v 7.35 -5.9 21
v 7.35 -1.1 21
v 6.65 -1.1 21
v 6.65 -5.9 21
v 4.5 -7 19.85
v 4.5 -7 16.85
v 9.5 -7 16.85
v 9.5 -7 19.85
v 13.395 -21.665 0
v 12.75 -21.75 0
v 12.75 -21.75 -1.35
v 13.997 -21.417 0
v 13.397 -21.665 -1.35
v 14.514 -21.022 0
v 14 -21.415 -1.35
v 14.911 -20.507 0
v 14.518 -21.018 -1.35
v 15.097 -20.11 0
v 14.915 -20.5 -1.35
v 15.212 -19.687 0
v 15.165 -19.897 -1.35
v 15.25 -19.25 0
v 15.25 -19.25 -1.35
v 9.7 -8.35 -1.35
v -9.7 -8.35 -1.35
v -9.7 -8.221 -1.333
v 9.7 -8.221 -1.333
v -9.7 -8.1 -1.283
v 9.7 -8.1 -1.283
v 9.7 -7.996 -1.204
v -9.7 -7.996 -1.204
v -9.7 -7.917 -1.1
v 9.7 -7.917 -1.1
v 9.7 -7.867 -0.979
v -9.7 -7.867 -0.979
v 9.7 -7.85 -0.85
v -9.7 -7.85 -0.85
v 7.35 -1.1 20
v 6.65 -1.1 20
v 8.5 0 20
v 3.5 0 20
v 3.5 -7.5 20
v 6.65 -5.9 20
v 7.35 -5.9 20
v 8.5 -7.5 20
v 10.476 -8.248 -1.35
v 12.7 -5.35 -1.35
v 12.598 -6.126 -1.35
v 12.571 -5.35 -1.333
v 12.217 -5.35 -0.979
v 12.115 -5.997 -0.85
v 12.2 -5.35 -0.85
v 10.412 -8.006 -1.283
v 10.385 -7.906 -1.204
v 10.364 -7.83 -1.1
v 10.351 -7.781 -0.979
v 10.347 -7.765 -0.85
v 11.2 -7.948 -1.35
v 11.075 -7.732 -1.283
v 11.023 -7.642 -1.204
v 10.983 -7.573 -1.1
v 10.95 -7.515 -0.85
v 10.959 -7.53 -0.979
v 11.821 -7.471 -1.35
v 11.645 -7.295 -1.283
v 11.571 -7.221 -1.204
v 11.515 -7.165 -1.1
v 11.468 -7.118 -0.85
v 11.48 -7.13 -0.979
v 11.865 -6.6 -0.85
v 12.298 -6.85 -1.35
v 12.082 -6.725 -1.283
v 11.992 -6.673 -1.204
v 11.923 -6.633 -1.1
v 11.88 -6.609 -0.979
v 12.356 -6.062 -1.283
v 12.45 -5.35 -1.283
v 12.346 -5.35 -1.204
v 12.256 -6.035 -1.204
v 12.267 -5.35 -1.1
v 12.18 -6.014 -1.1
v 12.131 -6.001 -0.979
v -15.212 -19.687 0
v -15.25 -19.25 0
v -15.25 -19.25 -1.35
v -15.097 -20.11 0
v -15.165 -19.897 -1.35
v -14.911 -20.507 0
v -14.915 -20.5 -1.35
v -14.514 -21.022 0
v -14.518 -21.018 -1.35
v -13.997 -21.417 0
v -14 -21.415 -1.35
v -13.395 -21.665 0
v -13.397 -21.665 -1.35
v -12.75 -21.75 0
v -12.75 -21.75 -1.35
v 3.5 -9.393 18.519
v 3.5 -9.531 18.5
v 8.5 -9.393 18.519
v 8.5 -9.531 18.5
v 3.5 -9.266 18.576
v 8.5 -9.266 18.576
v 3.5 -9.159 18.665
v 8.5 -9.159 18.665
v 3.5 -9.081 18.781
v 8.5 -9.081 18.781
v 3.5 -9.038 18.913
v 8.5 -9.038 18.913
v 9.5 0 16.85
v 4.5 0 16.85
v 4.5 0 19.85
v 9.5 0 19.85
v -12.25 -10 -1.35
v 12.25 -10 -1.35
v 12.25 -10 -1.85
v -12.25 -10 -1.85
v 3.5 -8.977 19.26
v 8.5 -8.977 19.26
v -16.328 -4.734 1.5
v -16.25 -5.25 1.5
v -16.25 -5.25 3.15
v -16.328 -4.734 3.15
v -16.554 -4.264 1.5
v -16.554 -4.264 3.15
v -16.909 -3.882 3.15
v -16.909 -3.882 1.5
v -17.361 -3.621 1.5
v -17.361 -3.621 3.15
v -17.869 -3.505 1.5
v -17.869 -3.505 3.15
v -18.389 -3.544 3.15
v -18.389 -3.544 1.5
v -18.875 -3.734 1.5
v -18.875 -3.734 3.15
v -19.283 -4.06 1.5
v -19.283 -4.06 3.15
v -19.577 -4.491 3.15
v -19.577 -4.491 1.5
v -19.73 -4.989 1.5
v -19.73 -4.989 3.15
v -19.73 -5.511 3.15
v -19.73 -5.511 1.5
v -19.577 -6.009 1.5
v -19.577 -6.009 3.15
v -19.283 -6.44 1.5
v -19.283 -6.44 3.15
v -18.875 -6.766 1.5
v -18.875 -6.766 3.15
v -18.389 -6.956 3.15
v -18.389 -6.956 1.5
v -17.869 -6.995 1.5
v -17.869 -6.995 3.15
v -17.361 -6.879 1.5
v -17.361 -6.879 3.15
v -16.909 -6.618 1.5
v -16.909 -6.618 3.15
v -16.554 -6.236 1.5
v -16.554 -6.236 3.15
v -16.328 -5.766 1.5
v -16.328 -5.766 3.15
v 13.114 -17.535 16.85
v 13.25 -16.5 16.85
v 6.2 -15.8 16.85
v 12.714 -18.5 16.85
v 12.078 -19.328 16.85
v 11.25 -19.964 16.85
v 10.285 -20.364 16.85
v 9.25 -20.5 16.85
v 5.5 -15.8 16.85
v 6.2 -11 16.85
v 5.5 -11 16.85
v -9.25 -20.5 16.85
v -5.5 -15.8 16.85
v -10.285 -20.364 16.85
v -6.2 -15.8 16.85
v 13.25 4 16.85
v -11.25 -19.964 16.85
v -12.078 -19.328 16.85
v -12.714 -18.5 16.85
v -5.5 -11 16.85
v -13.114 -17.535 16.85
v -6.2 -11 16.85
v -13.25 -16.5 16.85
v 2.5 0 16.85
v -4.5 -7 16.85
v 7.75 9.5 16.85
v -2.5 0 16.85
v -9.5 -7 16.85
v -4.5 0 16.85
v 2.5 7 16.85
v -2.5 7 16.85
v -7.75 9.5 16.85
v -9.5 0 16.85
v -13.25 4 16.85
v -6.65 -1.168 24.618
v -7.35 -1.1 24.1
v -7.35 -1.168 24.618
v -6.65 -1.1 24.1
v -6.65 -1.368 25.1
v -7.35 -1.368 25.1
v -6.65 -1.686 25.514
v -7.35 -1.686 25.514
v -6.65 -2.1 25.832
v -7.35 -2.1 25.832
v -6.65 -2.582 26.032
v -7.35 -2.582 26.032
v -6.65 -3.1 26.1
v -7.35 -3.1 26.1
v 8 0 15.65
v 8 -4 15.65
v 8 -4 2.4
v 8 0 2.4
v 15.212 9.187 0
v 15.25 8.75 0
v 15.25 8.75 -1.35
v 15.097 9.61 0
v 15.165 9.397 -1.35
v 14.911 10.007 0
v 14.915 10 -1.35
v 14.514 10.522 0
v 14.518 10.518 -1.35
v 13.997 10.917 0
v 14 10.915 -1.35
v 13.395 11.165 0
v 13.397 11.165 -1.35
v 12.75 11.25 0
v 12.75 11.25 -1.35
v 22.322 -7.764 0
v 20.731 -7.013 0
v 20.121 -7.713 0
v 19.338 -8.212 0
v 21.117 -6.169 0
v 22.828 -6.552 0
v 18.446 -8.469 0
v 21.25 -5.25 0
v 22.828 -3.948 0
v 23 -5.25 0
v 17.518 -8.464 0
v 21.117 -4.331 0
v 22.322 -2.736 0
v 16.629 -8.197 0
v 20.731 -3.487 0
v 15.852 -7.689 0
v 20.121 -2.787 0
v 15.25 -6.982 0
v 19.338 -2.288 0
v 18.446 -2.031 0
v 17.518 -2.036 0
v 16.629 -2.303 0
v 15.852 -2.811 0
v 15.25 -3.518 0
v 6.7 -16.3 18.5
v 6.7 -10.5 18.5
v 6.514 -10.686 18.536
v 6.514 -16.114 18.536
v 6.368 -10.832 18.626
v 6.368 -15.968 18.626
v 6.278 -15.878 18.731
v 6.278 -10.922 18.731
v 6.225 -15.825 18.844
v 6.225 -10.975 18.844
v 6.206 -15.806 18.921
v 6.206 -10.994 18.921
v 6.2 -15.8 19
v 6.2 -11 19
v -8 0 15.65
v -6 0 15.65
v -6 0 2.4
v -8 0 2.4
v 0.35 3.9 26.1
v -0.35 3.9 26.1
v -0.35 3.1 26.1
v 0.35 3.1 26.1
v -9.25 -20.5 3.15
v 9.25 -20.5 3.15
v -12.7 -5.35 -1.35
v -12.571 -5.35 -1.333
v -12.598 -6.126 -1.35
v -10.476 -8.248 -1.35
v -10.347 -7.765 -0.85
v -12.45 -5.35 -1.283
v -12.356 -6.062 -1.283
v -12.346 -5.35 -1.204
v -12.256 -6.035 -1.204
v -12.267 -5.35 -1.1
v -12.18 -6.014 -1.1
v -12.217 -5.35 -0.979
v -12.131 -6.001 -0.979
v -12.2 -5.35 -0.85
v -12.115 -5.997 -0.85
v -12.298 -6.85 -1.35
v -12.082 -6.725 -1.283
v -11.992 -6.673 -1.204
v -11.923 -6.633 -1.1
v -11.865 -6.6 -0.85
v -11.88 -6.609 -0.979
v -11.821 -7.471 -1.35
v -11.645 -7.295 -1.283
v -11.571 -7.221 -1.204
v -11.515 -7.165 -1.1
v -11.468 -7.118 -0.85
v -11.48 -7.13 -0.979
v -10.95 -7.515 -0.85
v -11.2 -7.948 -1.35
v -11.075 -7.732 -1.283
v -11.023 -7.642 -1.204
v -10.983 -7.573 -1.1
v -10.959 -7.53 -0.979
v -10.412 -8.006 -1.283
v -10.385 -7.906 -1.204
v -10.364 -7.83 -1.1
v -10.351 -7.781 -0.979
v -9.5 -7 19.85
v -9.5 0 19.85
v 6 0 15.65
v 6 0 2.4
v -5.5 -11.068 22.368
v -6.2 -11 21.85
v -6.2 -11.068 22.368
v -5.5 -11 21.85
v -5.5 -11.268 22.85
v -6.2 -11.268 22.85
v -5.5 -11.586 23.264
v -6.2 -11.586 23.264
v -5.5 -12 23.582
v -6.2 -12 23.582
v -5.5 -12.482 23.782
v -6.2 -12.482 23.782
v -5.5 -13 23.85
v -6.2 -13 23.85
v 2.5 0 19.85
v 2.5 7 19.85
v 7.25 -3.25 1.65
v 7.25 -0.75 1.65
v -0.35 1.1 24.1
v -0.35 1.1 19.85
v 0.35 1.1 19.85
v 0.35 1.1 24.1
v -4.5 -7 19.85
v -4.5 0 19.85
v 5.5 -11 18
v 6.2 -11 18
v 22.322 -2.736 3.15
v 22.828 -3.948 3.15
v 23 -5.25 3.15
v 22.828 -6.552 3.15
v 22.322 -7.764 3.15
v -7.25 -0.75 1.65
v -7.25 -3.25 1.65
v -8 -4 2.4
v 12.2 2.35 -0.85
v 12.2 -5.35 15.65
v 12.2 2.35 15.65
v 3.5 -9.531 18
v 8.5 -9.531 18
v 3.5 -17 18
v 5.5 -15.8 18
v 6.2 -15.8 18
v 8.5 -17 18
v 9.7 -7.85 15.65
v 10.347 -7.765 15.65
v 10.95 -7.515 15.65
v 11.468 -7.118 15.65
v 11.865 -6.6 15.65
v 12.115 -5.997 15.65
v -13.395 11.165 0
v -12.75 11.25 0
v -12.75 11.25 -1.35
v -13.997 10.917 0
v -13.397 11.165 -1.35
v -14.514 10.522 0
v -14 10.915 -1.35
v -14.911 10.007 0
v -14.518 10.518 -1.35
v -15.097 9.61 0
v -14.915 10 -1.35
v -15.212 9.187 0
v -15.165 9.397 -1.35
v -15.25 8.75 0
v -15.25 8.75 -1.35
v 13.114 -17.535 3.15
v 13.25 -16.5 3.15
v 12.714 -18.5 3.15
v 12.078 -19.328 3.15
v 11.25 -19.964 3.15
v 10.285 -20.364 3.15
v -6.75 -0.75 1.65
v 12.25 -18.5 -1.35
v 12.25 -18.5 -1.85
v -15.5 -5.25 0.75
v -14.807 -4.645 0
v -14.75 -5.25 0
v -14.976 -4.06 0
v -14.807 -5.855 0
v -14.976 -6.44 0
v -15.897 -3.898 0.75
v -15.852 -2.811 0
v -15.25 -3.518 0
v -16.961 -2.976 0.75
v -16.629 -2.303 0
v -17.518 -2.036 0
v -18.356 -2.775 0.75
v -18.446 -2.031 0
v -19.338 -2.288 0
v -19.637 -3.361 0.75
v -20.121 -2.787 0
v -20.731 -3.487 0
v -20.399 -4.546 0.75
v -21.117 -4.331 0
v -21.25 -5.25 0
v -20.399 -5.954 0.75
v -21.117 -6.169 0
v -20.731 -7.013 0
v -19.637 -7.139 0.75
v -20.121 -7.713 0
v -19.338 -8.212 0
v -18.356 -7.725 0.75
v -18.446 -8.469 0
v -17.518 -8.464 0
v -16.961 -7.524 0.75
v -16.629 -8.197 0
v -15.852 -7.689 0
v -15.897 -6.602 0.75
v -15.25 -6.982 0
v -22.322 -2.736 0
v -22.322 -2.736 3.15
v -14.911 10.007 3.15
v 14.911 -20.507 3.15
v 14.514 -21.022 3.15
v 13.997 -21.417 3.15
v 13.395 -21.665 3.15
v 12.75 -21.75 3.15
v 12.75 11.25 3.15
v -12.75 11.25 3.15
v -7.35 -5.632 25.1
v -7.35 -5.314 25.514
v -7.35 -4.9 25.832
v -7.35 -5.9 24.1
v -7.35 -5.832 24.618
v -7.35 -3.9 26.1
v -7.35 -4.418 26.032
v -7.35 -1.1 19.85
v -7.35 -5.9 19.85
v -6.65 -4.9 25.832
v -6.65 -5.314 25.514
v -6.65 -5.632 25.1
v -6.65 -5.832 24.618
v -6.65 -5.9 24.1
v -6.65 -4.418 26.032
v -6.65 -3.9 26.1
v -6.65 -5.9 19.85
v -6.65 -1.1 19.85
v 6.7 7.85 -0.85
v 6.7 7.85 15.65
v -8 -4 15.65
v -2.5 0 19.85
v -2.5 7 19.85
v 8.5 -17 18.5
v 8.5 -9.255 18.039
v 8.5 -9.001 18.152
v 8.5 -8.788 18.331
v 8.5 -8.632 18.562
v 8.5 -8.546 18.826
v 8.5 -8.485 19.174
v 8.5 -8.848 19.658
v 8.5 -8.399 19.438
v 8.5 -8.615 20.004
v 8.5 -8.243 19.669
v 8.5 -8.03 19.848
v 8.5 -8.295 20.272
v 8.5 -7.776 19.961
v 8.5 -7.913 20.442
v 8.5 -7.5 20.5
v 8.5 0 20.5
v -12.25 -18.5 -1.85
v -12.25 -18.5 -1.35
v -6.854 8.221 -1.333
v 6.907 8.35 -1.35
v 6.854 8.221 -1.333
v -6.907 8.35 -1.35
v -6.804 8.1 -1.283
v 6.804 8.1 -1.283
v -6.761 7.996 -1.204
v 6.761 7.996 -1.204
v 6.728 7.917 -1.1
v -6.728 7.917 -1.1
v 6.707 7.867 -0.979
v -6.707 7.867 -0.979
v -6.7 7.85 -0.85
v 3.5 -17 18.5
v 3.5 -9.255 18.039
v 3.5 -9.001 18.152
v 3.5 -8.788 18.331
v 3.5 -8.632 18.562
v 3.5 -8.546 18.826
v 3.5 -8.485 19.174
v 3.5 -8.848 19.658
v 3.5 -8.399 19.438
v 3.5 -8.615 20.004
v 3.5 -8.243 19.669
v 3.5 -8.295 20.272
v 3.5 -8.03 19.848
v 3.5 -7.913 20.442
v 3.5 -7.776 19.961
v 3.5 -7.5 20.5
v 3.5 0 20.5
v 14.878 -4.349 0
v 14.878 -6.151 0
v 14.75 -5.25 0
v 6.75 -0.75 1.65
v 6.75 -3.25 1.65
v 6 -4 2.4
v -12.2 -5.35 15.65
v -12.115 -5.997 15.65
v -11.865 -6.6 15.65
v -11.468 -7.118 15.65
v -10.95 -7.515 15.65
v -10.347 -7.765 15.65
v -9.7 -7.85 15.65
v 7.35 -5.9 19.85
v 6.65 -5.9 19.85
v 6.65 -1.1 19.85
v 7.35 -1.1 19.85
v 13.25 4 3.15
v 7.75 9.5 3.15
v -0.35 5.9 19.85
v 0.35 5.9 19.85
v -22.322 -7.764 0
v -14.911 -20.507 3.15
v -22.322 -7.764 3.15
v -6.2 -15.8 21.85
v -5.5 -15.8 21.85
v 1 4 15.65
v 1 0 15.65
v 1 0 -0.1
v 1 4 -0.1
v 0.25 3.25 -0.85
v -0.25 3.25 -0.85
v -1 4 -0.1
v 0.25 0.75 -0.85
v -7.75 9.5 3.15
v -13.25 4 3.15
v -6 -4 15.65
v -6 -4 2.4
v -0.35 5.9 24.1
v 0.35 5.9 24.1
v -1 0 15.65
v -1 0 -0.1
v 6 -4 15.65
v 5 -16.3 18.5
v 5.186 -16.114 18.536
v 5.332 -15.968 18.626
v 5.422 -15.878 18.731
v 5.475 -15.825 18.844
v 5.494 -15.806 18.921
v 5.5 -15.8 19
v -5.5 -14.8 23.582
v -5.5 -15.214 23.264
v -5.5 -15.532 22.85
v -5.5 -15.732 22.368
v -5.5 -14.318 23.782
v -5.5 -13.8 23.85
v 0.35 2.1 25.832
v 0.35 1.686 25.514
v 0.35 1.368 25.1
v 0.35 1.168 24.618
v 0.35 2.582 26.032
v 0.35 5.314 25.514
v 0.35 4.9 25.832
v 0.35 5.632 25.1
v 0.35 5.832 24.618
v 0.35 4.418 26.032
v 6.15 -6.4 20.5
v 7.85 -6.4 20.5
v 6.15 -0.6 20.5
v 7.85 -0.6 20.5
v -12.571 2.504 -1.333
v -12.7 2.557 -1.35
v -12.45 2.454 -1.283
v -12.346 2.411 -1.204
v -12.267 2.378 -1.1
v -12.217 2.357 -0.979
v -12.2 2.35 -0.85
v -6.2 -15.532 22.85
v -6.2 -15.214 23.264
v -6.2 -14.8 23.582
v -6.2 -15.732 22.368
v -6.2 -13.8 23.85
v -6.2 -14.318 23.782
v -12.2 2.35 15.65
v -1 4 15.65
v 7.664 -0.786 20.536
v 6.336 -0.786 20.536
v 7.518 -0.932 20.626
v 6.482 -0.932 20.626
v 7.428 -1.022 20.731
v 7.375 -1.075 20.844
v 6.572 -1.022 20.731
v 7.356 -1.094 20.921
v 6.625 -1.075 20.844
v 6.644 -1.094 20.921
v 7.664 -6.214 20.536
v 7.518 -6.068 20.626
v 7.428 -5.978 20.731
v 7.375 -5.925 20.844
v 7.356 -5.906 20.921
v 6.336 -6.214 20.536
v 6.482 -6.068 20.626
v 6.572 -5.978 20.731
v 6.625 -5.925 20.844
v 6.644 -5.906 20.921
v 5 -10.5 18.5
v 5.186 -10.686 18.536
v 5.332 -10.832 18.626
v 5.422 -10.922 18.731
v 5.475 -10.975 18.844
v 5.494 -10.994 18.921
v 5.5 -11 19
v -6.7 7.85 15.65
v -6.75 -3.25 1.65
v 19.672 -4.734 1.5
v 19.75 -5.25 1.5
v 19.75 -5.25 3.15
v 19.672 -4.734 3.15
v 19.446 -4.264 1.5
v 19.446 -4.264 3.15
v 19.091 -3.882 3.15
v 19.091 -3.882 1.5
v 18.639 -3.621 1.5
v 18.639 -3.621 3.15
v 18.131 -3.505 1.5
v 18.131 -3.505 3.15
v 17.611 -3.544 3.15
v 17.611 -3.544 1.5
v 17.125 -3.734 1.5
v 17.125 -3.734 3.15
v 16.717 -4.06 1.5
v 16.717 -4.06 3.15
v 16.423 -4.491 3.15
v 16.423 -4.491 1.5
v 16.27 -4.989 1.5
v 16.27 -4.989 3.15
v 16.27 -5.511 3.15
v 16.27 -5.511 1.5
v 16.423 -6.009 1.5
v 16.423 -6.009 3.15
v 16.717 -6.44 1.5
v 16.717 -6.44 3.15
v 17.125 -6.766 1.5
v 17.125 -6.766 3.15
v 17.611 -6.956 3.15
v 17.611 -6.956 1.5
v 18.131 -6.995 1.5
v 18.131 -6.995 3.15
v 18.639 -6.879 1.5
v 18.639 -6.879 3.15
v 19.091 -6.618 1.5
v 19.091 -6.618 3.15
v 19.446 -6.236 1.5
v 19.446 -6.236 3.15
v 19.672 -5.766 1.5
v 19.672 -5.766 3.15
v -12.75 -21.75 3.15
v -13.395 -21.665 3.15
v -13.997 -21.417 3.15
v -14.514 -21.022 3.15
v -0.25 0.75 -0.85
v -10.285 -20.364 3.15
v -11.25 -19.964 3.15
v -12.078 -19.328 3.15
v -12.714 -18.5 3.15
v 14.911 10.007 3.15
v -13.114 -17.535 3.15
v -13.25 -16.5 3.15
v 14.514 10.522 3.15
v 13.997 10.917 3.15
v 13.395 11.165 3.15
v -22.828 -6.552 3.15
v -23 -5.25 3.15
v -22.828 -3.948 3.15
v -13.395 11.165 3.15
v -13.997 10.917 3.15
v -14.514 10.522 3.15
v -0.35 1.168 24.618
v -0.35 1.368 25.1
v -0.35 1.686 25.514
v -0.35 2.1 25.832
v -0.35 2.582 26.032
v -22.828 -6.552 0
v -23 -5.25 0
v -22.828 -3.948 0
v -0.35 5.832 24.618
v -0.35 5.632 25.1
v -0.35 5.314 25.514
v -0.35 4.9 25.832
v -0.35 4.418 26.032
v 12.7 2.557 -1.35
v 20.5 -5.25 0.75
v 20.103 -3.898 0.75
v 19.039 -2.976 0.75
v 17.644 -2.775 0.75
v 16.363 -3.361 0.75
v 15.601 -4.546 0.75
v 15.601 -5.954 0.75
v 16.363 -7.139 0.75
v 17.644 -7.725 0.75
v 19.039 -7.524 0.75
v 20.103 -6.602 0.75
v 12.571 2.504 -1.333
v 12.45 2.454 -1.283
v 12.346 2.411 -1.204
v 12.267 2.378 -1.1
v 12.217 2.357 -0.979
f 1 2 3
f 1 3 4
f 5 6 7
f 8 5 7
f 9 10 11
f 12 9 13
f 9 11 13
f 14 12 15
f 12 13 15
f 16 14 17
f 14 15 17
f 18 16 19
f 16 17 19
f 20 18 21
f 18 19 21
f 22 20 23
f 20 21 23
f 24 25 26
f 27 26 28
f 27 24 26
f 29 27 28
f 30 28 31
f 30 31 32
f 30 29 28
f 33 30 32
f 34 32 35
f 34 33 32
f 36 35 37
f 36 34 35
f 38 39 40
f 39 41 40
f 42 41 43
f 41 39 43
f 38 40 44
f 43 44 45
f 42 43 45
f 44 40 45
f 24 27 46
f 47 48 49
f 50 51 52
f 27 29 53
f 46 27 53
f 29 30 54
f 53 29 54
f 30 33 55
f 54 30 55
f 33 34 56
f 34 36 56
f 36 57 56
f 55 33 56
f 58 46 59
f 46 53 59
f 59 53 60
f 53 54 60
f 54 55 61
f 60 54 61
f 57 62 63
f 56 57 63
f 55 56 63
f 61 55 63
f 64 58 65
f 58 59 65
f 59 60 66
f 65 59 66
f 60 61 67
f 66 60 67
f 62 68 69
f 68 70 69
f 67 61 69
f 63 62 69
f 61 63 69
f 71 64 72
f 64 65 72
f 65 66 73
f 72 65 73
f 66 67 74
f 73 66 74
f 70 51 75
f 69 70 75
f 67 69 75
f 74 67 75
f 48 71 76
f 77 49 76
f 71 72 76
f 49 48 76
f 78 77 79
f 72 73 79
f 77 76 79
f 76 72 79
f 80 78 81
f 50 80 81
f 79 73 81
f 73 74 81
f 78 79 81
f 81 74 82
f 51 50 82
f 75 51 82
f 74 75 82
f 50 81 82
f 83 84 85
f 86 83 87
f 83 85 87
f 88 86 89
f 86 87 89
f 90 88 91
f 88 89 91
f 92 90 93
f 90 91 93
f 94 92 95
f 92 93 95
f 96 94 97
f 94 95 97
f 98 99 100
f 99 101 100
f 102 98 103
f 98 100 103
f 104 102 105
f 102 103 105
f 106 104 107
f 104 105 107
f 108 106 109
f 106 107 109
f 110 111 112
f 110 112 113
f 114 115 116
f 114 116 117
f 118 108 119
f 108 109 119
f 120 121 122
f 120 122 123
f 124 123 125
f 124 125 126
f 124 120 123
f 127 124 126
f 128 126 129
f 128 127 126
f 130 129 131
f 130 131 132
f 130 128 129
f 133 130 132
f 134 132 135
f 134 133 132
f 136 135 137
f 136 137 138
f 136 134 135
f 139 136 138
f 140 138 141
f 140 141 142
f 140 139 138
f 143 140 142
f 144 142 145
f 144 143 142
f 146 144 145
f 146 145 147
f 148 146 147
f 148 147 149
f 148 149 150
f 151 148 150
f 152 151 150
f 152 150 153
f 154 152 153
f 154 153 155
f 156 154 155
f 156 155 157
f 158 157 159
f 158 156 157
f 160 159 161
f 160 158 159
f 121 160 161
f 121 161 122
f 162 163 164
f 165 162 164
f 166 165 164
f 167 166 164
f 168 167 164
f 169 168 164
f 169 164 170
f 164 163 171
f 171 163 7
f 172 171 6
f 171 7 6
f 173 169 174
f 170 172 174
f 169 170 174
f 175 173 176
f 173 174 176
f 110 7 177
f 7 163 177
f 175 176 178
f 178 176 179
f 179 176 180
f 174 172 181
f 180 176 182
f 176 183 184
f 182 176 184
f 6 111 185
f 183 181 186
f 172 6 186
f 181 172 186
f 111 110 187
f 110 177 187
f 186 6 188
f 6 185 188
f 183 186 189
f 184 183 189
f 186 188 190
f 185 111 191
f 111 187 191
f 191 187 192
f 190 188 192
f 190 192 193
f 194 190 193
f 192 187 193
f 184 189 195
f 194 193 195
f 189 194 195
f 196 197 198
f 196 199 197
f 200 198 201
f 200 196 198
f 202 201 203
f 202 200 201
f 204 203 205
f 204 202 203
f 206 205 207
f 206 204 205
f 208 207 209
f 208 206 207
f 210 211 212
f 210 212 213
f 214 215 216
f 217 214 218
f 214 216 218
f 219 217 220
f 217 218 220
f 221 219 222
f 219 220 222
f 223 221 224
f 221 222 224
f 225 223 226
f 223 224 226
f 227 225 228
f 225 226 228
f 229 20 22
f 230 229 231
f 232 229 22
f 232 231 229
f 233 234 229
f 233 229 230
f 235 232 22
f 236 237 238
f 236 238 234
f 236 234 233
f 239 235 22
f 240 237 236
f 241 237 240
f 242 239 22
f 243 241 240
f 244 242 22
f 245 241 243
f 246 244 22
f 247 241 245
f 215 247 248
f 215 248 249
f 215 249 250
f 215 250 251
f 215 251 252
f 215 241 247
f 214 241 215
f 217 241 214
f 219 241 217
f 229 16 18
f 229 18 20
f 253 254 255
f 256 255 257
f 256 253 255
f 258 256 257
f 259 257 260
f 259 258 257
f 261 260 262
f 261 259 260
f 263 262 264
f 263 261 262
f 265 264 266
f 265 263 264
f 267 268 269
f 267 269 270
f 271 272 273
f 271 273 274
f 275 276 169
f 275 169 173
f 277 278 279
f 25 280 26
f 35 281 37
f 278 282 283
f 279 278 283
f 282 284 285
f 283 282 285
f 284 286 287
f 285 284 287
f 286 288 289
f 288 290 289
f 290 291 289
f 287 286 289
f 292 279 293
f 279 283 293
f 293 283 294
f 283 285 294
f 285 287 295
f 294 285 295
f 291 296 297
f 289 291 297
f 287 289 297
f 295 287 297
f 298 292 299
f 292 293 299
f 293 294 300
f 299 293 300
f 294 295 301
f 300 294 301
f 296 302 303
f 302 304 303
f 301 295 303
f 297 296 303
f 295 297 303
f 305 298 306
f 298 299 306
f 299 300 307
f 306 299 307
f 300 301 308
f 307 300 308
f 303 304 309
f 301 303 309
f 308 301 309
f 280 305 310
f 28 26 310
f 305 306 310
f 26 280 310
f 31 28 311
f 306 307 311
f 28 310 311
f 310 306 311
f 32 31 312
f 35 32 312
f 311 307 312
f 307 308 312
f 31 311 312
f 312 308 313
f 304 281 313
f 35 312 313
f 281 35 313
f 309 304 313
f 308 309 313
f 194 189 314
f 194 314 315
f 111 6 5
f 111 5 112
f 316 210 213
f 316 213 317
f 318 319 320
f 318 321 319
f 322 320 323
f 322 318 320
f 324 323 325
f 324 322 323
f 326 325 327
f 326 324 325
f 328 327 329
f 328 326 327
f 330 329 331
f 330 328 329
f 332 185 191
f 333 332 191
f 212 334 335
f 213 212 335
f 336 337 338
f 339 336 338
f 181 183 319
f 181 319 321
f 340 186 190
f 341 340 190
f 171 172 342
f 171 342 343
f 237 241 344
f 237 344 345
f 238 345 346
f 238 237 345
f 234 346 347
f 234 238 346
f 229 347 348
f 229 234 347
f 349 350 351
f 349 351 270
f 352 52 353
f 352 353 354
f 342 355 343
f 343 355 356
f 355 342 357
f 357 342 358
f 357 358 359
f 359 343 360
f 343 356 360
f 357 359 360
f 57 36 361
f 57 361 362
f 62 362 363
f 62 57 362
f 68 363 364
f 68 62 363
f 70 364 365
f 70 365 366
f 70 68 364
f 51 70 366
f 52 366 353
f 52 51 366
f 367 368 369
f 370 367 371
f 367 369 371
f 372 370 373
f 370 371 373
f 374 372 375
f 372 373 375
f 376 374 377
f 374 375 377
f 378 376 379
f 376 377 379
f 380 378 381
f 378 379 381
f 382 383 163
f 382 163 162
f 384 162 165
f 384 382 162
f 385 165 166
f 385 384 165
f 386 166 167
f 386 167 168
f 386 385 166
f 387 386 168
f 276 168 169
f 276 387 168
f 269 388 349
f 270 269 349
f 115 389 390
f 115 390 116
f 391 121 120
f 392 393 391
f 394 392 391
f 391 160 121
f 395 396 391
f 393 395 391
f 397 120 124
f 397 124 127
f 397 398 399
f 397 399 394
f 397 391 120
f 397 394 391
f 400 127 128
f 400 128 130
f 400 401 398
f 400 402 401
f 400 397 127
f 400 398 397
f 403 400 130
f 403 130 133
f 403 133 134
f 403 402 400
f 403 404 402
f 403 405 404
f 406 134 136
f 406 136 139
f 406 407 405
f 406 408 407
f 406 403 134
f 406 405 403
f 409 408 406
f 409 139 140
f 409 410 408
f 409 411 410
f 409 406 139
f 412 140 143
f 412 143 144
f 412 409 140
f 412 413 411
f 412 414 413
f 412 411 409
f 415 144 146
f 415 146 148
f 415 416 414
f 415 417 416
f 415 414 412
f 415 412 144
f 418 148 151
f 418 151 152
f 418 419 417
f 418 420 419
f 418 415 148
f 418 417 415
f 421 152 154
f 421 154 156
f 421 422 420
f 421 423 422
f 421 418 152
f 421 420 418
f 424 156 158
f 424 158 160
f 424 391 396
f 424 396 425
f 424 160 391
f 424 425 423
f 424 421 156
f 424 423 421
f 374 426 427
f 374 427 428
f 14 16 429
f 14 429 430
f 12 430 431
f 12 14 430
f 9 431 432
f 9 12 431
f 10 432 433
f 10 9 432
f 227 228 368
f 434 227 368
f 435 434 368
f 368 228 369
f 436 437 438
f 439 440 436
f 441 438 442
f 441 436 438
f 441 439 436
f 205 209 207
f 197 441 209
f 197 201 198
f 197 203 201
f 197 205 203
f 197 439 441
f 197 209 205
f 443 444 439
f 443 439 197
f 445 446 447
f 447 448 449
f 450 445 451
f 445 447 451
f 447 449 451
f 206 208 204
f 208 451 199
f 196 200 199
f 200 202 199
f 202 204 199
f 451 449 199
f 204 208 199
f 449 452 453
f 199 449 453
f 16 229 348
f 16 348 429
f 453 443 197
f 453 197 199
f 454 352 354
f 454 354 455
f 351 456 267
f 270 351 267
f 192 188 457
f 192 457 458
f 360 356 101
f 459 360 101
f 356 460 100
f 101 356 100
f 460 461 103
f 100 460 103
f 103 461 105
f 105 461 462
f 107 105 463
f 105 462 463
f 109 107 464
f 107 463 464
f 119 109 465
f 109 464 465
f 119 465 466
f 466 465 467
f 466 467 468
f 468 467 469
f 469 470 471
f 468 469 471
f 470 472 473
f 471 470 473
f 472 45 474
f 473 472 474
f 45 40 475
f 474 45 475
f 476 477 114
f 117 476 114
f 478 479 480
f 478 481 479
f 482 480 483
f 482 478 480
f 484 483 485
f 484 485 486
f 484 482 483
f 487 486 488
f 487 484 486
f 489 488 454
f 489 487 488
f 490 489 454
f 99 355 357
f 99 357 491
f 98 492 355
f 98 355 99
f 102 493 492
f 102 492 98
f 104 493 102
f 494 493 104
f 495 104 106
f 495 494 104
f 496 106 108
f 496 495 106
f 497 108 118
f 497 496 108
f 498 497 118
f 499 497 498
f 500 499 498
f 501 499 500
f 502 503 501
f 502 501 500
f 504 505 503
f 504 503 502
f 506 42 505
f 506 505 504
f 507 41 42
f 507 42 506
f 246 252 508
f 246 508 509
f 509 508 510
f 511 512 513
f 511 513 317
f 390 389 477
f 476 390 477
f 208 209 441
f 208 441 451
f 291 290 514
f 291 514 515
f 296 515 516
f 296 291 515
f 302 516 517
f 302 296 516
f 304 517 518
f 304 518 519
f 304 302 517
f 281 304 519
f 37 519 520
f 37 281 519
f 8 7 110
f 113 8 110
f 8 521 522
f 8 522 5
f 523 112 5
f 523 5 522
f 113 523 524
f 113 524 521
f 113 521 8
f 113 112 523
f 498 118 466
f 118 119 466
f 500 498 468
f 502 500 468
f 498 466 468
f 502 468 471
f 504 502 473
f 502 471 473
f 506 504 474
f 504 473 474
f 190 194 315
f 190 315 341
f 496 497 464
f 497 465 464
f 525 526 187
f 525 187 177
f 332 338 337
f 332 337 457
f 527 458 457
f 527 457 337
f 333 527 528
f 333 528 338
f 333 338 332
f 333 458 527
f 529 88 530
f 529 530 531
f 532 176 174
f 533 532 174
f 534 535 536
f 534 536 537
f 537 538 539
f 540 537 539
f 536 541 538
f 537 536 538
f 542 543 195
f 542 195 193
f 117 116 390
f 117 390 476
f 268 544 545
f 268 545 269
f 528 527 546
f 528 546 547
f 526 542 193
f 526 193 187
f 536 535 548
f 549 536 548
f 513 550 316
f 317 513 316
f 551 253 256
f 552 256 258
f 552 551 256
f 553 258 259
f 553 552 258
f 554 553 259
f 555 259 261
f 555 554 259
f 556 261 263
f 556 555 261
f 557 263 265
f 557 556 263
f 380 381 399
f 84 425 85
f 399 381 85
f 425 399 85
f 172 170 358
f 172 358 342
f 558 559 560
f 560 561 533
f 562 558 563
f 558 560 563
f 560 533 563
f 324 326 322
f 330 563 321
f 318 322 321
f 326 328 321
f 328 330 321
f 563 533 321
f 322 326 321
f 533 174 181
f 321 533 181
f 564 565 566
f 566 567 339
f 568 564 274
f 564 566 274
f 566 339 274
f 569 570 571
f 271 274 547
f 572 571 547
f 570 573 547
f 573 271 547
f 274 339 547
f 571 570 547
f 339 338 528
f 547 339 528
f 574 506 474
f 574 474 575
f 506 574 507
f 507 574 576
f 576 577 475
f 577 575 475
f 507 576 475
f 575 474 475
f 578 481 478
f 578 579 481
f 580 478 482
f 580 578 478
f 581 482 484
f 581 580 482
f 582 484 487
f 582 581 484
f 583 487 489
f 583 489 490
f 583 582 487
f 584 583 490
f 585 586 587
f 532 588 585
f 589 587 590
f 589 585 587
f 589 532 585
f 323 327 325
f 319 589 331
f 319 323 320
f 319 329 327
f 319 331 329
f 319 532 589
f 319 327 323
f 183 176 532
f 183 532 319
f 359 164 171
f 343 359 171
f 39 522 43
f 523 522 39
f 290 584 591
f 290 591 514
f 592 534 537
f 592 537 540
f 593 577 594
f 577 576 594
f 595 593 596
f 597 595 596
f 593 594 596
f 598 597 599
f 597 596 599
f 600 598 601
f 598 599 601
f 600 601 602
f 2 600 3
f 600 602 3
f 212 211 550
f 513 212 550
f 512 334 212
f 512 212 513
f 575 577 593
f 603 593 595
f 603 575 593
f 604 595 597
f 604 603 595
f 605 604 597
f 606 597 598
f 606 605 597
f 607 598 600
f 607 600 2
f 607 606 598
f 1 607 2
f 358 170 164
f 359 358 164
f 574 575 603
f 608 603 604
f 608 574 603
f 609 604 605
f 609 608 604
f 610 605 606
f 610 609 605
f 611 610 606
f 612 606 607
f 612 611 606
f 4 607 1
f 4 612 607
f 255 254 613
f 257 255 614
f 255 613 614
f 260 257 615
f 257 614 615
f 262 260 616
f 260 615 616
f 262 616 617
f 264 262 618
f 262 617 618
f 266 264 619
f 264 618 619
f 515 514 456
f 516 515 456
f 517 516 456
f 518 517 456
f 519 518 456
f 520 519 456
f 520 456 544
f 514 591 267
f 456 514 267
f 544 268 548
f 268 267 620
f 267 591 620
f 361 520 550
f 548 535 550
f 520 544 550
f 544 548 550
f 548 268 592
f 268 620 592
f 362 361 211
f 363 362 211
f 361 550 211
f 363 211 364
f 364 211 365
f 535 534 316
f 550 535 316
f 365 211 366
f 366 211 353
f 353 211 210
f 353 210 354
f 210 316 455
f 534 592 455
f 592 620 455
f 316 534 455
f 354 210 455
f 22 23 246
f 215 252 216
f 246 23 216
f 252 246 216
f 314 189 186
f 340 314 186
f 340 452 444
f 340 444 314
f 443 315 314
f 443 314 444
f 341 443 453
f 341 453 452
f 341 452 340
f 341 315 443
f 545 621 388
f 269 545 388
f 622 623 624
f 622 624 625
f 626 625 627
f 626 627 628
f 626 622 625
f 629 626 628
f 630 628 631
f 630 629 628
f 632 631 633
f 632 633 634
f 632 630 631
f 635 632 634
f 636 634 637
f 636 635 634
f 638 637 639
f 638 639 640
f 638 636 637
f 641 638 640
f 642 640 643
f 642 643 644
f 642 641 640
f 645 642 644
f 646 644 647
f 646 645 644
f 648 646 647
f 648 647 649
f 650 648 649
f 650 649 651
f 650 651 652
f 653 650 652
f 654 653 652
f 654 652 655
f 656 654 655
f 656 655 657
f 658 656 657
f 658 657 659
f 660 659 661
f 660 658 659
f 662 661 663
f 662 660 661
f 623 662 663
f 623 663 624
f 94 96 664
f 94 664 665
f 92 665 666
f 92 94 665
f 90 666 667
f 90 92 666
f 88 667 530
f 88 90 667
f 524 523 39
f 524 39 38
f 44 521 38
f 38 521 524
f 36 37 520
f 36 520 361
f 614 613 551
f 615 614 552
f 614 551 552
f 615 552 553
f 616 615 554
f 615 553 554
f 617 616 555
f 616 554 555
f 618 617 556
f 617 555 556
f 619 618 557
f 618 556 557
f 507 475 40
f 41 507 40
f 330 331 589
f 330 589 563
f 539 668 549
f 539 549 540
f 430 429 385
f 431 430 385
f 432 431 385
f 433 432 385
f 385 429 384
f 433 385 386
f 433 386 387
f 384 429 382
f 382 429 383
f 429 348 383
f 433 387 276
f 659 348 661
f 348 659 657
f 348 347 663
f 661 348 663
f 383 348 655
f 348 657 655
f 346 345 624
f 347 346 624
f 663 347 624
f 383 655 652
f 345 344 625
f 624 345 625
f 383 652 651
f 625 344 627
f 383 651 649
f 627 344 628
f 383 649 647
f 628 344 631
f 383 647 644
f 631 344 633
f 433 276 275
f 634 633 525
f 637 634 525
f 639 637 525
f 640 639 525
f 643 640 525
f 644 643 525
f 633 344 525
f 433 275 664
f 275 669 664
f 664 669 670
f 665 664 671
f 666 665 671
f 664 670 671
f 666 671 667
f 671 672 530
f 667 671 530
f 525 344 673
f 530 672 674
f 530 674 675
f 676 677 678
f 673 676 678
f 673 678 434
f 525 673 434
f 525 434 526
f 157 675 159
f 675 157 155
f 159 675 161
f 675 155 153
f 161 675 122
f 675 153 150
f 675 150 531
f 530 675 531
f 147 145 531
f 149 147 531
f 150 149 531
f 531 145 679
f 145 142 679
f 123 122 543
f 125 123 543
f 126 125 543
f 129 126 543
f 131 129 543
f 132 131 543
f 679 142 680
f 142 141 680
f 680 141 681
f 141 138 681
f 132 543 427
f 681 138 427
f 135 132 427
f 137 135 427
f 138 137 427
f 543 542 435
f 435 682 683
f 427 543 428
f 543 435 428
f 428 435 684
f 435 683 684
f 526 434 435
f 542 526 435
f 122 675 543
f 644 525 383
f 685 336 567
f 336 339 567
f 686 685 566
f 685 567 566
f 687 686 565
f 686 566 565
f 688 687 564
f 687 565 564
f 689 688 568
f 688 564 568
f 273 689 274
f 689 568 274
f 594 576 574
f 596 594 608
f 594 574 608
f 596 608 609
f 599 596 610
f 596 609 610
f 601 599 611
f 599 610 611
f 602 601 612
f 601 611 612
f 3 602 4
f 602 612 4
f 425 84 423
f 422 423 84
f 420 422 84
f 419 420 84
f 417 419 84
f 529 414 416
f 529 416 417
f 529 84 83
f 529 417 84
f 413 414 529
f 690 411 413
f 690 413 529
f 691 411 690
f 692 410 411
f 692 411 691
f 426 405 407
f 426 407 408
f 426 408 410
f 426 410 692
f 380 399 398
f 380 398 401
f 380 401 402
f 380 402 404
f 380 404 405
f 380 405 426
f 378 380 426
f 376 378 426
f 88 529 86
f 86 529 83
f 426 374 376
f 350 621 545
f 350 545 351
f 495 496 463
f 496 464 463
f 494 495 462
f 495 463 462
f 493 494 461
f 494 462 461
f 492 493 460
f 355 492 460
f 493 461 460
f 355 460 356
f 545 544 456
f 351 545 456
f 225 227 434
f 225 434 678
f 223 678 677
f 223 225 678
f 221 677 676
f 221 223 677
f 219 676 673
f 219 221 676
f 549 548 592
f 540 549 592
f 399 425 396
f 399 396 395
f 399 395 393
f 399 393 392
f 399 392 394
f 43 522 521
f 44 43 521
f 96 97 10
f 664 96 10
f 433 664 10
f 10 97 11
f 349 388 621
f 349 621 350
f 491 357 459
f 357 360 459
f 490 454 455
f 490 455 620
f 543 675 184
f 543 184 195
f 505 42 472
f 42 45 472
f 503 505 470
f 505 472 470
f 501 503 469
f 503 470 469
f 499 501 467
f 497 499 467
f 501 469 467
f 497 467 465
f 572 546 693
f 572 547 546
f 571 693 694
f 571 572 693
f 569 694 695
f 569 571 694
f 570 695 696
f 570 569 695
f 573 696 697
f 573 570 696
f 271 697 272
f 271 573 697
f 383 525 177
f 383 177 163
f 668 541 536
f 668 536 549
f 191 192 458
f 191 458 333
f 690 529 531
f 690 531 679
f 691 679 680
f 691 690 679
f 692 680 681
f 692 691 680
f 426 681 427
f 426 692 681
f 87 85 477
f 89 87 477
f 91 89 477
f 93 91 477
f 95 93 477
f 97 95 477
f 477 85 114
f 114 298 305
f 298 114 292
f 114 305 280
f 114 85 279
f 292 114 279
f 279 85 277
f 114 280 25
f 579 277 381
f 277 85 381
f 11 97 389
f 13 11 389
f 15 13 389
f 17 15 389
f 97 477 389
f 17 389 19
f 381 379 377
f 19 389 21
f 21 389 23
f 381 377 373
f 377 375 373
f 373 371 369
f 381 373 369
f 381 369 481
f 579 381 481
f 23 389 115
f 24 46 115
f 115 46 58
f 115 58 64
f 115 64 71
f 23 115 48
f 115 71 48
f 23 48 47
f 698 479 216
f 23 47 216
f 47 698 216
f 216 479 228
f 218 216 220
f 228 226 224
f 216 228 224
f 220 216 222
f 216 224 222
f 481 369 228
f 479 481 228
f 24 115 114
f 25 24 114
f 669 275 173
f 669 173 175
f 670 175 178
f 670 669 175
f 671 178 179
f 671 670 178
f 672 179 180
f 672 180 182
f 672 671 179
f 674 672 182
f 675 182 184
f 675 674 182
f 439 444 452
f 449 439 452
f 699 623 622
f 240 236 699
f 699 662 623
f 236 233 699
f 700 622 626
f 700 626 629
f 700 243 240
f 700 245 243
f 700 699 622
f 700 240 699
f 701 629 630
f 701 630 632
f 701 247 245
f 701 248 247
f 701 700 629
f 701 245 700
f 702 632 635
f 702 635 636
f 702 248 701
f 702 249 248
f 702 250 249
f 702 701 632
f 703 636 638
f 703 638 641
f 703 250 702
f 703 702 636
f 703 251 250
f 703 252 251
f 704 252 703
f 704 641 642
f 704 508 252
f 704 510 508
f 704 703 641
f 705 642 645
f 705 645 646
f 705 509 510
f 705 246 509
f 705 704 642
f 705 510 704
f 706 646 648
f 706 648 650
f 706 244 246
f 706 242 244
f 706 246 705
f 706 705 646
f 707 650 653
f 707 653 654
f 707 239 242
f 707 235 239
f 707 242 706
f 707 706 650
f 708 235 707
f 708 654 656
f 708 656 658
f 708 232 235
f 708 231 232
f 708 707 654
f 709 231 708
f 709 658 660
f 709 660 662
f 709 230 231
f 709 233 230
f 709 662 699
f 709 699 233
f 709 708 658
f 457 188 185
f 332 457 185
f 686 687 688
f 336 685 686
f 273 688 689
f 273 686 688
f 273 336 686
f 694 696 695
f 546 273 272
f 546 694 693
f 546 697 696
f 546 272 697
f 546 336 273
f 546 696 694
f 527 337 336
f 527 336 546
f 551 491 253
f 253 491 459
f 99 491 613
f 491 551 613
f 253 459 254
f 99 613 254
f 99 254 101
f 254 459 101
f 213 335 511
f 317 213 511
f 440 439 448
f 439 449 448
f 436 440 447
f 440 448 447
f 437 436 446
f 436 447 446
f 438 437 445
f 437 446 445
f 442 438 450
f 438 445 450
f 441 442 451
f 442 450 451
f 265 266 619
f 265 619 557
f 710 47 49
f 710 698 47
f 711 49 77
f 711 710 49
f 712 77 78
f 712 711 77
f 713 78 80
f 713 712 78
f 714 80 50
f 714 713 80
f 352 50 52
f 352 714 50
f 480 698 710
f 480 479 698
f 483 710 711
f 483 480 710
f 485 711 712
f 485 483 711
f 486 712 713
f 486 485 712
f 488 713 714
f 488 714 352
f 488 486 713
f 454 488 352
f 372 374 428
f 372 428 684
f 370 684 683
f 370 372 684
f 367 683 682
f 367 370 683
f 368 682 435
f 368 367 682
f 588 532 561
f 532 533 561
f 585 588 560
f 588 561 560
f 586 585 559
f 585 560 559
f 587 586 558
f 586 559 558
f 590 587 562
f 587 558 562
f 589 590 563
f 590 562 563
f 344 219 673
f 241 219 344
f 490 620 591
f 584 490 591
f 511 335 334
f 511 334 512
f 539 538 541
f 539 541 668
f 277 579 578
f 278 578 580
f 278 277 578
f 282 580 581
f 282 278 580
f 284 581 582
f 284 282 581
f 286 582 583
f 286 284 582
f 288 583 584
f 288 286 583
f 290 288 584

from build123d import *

# Parameters (mm, degrees)
SKETCH1_R           = 1.75
EXTRUDE1_DEPTH      = 3.15
CHAMFER1_SIZE       = 1.5
EXTRUDE2_START      = 1.35
EXTRUDE2_DEPTH      = 1.35
EXTRUDE3_DEPTH      = 13.7
SKETCH4_W           = 5
SKETCH4_H           = 7
EXTRUDE4_DEPTH      = 3
SKETCH5_W           = 0.7
SKETCH5_H           = 4.8
EXTRUDE5_DEPTH      = 6.25
EXTRUDE6_DEPTH      = 17
FILLET1_R           = 0.5
SKETCH7_W           = 2
SKETCH7_H           = 4
EXTRUDE7_DEPTH      = 14
SKETCH8_W           = 2
SKETCH8_H           = 4
EXTRUDE8_DEPTH      = 16.5
CHAMFER3_SIZE       = 0.75
SKETCH9_W           = 0.7
SKETCH9_H           = 4.8
EXTRUDE9_DEPTH      = 7
FILLET2_R           = 2
EXTRUDE_THIN1_DEPTH = 2.5
EXTRUDE10_DEPTH     = 2
FILLET3_R           = 0.5
FILLET4_R           = 0.5
SKETCH13_W          = 24.5
SKETCH13_H          = 8.5
EXTRUDE11_DEPTH     = 0.5


with BuildPart() as part:
    # Sketch1 → Extrude1 (new body)
    with BuildSketch(Plane.XY):
        with BuildLine():
            Line((-12.75, 11.25), (12.75, 11.25))
            ThreePointArc((12.75, 11.25), (13.996574867, 10.917037402), (14.911099489, 10.00684088))
            Line((14.911099489, 10.00684088), (22.322198979, -2.73631824))
            ThreePointArc((22.322198979, -2.73631824), (23, -5.25), (22.322198979, -7.76368176))
            Line((22.322198979, -7.76368176), (14.911099489, -20.50684088))
            ThreePointArc((14.911099489, -20.50684088), (13.996574867, -21.417037402), (12.75, -21.75))
            Line((12.75, -21.75), (-12.75, -21.75))
            ThreePointArc((-12.75, -21.75), (-13.996574867, -21.417037402), (-14.911099489, -20.50684088))
            Line((-14.911099489, -20.50684088), (-22.322198979, -7.76368176))
            ThreePointArc((-22.322198979, -7.76368176), (-23, -5.25), (-22.322198979, -2.73631824))
            Line((-22.322198979, -2.73631824), (-14.911099489, 10.00684088))
            ThreePointArc((-14.911099489, 10.00684088), (-13.996574867, 10.917037402), (-12.75, 11.25))
        make_face()
        with Locations((-18, -5.25)):
            Circle(SKETCH1_R, mode=Mode.SUBTRACT)
        with Locations((18, -5.25)):
            Circle(SKETCH1_R, mode=Mode.SUBTRACT)
    extrude(amount=EXTRUDE1_DEPTH)

    # Chamfer1
    chamfer1_edges = [part.edges().sort_by_distance(p)[0] for p in [
        (-19.75, -5.25, 0),
        (16.25, -5.25, 0),
    ]]
    chamfer(chamfer1_edges, length=CHAMFER1_SIZE)

    # Sketch2 → Extrude2 (add)
    with BuildSketch(Plane(origin=(0, 0, 0), x_dir=(-1, 0, 0), z_dir=(0, 0, -1)).offset(EXTRUDE2_START)):
        with BuildLine():
            Line((-12.75, 11.25), (12.75, 11.25))
            ThreePointArc((12.75, 11.25), (14.517766953, 10.517766953), (15.25, 8.75))
            Line((15.25, 8.75), (15.25, -19.25))
            ThreePointArc((15.25, -19.25), (14.517766953, -21.017766953), (12.75, -21.75))
            Line((12.75, -21.75), (-12.75, -21.75))
            ThreePointArc((-12.75, -21.75), (-14.517766953, -21.017766953), (-15.25, -19.25))
            Line((-15.25, -19.25), (-15.25, 8.75))
            ThreePointArc((-15.25, 8.75), (-14.517766953, 10.517766953), (-12.75, 11.25))
        make_face()
    extrude(amount=-EXTRUDE2_DEPTH)

    # Sketch3 → Extrude3 (add)
    with BuildSketch(Plane.XY.offset(3.15)):
        with BuildLine():
            Line((-7.75, 9.5), (7.75, 9.5))
            Line((7.75, 9.5), (13.25, 4))
            Line((13.25, 4), (13.25, -16.5))
            ThreePointArc((13.25, -16.5), (12.078427125, -19.328427125), (9.25, -20.5))
            Line((9.25, -20.5), (-9.25, -20.5))
            ThreePointArc((-9.25, -20.5), (-12.078427125, -19.328427125), (-13.25, -16.5))
            Line((-13.25, -16.5), (-13.25, 4))
            Line((-13.25, 4), (-7.75, 9.5))
        make_face()
    extrude(amount=EXTRUDE3_DEPTH)

    # Sketch4 → Extrude4 (add)
    with BuildSketch(Plane.XY.offset(16.85)):
        with Locations((-7, -3.5)):
            Rectangle(SKETCH4_W, SKETCH4_H)
        with Locations((0, 3.5)):
            Rectangle(SKETCH4_W, SKETCH4_H)
        with Locations((7, -3.5)):
            Rectangle(SKETCH4_W, SKETCH4_H)
    extrude(amount=EXTRUDE4_DEPTH)

    # Sketch5 → Extrude5 (add)
    with BuildSketch(Plane.XY.offset(19.85)):
        with Locations((0, 3.5)):
            Rectangle(SKETCH5_W, SKETCH5_H)
        with Locations((7, -3.5)):
            Rectangle(SKETCH5_W, SKETCH5_H)
        with Locations((-7, -3.5)):
            Rectangle(SKETCH5_W, SKETCH5_H)
    extrude(amount=EXTRUDE5_DEPTH)

    # Sketch6 → Extrude6 (cut)
    with BuildSketch(Plane(origin=(0, 0, -1.35), x_dir=(-1, 0, 0), z_dir=(0, 0, -1))):
        with BuildLine():
            Line((-6.7, 7.85), (6.7, 7.85))
            Line((6.7, 7.85), (12.2, 2.35))
            Line((12.2, 2.35), (12.2, -5.35))
            ThreePointArc((12.2, -5.35), (11.467766953, -7.117766953), (9.7, -7.85))
            Line((9.7, -7.85), (-9.7, -7.85))
            ThreePointArc((-9.7, -7.85), (-11.467766953, -7.117766953), (-12.2, -5.35))
            Line((-12.2, -5.35), (-12.2, 2.35))
            Line((-12.2, 2.35), (-6.7, 7.85))
        make_face()
    extrude(amount=-EXTRUDE6_DEPTH, mode=Mode.SUBTRACT)

    # Fillet1
    fillet1_edges = [part.edges().sort_by_distance(p)[0] for p in [
        (9.45, 5.1, -1.35),
        (12.2, -1.5, -1.35),
        (11.467766953, -7.117766953, -1.35),
        (0, -7.85, -1.35),
        (-11.467766953, -7.117766953, -1.35),
        (-12.2, -1.5, -1.35),
        (-9.45, 5.1, -1.35),
        (0, 7.85, -1.35),
    ]]
    fillet(fillet1_edges, radius=FILLET1_R)

    # Sketch7 → Extrude7 (add)
    with BuildSketch(Plane(origin=(0, 0, 15.65), x_dir=(-1, 0, 0), z_dir=(0, 0, -1))):
        with Locations((-7, -2)):
            Rectangle(SKETCH7_W, SKETCH7_H)
        with Locations((7, -2)):
            Rectangle(SKETCH7_W, SKETCH7_H)
    extrude(amount=EXTRUDE7_DEPTH)

    # Sketch8 → Extrude8 (add)
    with BuildSketch(Plane(origin=(0, 0, 15.65), x_dir=(-1, 0, 0), z_dir=(0, 0, -1))):
        with Locations((0, 2)):
            Rectangle(SKETCH8_W, SKETCH8_H)
    extrude(amount=EXTRUDE8_DEPTH)

    # Chamfer3
    chamfer3_edges = [part.edges().sort_by_distance(p)[0] for p in [
        (8, -2, 1.65),
        (7, -4, 1.65),
        (6, -2, 1.65),
        (7, 0, 1.65),
        (-6, -2, 1.65),
        (-7, -4, 1.65),
        (-8, -2, 1.65),
        (-7, 0, 1.65),
        (1, 2, -0.85),
        (0, 0, -0.85),
        (-1, 2, -0.85),
        (0, 4, -0.85),
    ]]
    chamfer(chamfer3_edges, length=CHAMFER3_SIZE)

    # Sketch9 → Extrude9 (add)
    with BuildSketch(Plane.XY.offset(16.85)):
        with Locations((-5.85, -13.4)):
            Rectangle(SKETCH9_W, SKETCH9_H)
        with Locations((5.85, -13.4)):
            Rectangle(SKETCH9_W, SKETCH9_H)
    extrude(amount=EXTRUDE9_DEPTH)

    # Fillet2
    fillet2_edges = [part.edges().sort_by_distance(p)[0] for p in [
        (0, 1.1, 26.1),
        (0, 5.9, 26.1),
        (7, -5.9, 26.1),
        (7, -1.1, 26.1),
        (-7, -5.9, 26.1),
        (-7, -1.1, 26.1),
        (-5.85, -15.8, 23.85),
        (-5.85, -11, 23.85),
        (5.85, -15.8, 23.85),
        (5.85, -11, 23.85),
    ]]
    fillet(fillet2_edges, radius=FILLET2_R)

    # Sketch10 → Extrude-Thin1 (add, symmetric)
    with BuildSketch(Plane(origin=(6, 0, 0), x_dir=(0, 0, -1), z_dir=(1, 0, 0))):
        with BuildLine():
            Line((-20, 0), (-20, -7.5))
            ThreePointArc((-20, -7.5), (-19.766044443, -8.14278761), (-19.173648178, -8.484807753))
            Line((-19.173648178, -8.484807753), (-18.826351822, -8.546045471))
            ThreePointArc((-18.826351822, -8.546045471), (-18.233955557, -8.888065614), (-18, -9.530853224))
            Line((-18, -9.530853224), (-18, -17))
            Line((-18, -17), (-18.5, -17))
            Line((-18.5, -17), (-18.5, -9.530853224))
            ThreePointArc((-18.5, -9.530853224), (-18.616977778, -9.209459419), (-18.913175911, -9.038449347))
            Line((-18.913175911, -9.038449347), (-19.260472267, -8.97721163))
            ThreePointArc((-19.260472267, -8.97721163), (-20.149066665, -8.464181415), (-20.5, -7.5))
            Line((-20.5, -7.5), (-20.5, 0))
            Line((-20.5, 0), (-20, 0))
        make_face()
    extrude(amount=EXTRUDE_THIN1_DEPTH, both=True)

    # Sketch12 → Extrude10 (cut)
    with BuildSketch(Plane(origin=(7.35, 0, 0), x_dir=(0, 0, -1), z_dir=(1, 0, 0))):
        Polygon((-21, -1.1), (-21, -10.028067218), (-19, -10.028067218), (-19, -16.1), (-27, -16.1), (-27, -1.1), align=None)
    extrude(amount=-EXTRUDE10_DEPTH, mode=Mode.SUBTRACT)

    # Fillet3
    fillet3_edges = [part.edges().sort_by_distance(p)[0] for p in [
        (5.85, -11, 18.5),
        (5.5, -13.4, 18.5),
        (5.85, -15.8, 18.5),
        (6.2, -13.4, 18.5),
    ]]
    fillet(fillet3_edges, radius=FILLET3_R - 0.0001)  # a hair under: the kernel refuses the full size

    # Fillet4
    fillet4_edges = [part.edges().sort_by_distance(p)[0] for p in [
        (7, -1.1, 20.5),
        (6.65, -3.5, 20.5),
        (7, -5.9, 20.5),
        (7.35, -3.5, 20.5),
    ]]
    fillet(fillet4_edges, radius=FILLET4_R - 0.0001)  # a hair under: the kernel refuses the full size

    # Sketch13 → Extrude11 (add)
    with BuildSketch(Plane(origin=(0, 0, -1.35), x_dir=(-1, 0, 0), z_dir=(0, 0, -1))):
        with Locations((0, -14.25)):
            Rectangle(SKETCH13_W, SKETCH13_H)
    extrude(amount=EXTRUDE11_DEPTH)


solid = part.part
